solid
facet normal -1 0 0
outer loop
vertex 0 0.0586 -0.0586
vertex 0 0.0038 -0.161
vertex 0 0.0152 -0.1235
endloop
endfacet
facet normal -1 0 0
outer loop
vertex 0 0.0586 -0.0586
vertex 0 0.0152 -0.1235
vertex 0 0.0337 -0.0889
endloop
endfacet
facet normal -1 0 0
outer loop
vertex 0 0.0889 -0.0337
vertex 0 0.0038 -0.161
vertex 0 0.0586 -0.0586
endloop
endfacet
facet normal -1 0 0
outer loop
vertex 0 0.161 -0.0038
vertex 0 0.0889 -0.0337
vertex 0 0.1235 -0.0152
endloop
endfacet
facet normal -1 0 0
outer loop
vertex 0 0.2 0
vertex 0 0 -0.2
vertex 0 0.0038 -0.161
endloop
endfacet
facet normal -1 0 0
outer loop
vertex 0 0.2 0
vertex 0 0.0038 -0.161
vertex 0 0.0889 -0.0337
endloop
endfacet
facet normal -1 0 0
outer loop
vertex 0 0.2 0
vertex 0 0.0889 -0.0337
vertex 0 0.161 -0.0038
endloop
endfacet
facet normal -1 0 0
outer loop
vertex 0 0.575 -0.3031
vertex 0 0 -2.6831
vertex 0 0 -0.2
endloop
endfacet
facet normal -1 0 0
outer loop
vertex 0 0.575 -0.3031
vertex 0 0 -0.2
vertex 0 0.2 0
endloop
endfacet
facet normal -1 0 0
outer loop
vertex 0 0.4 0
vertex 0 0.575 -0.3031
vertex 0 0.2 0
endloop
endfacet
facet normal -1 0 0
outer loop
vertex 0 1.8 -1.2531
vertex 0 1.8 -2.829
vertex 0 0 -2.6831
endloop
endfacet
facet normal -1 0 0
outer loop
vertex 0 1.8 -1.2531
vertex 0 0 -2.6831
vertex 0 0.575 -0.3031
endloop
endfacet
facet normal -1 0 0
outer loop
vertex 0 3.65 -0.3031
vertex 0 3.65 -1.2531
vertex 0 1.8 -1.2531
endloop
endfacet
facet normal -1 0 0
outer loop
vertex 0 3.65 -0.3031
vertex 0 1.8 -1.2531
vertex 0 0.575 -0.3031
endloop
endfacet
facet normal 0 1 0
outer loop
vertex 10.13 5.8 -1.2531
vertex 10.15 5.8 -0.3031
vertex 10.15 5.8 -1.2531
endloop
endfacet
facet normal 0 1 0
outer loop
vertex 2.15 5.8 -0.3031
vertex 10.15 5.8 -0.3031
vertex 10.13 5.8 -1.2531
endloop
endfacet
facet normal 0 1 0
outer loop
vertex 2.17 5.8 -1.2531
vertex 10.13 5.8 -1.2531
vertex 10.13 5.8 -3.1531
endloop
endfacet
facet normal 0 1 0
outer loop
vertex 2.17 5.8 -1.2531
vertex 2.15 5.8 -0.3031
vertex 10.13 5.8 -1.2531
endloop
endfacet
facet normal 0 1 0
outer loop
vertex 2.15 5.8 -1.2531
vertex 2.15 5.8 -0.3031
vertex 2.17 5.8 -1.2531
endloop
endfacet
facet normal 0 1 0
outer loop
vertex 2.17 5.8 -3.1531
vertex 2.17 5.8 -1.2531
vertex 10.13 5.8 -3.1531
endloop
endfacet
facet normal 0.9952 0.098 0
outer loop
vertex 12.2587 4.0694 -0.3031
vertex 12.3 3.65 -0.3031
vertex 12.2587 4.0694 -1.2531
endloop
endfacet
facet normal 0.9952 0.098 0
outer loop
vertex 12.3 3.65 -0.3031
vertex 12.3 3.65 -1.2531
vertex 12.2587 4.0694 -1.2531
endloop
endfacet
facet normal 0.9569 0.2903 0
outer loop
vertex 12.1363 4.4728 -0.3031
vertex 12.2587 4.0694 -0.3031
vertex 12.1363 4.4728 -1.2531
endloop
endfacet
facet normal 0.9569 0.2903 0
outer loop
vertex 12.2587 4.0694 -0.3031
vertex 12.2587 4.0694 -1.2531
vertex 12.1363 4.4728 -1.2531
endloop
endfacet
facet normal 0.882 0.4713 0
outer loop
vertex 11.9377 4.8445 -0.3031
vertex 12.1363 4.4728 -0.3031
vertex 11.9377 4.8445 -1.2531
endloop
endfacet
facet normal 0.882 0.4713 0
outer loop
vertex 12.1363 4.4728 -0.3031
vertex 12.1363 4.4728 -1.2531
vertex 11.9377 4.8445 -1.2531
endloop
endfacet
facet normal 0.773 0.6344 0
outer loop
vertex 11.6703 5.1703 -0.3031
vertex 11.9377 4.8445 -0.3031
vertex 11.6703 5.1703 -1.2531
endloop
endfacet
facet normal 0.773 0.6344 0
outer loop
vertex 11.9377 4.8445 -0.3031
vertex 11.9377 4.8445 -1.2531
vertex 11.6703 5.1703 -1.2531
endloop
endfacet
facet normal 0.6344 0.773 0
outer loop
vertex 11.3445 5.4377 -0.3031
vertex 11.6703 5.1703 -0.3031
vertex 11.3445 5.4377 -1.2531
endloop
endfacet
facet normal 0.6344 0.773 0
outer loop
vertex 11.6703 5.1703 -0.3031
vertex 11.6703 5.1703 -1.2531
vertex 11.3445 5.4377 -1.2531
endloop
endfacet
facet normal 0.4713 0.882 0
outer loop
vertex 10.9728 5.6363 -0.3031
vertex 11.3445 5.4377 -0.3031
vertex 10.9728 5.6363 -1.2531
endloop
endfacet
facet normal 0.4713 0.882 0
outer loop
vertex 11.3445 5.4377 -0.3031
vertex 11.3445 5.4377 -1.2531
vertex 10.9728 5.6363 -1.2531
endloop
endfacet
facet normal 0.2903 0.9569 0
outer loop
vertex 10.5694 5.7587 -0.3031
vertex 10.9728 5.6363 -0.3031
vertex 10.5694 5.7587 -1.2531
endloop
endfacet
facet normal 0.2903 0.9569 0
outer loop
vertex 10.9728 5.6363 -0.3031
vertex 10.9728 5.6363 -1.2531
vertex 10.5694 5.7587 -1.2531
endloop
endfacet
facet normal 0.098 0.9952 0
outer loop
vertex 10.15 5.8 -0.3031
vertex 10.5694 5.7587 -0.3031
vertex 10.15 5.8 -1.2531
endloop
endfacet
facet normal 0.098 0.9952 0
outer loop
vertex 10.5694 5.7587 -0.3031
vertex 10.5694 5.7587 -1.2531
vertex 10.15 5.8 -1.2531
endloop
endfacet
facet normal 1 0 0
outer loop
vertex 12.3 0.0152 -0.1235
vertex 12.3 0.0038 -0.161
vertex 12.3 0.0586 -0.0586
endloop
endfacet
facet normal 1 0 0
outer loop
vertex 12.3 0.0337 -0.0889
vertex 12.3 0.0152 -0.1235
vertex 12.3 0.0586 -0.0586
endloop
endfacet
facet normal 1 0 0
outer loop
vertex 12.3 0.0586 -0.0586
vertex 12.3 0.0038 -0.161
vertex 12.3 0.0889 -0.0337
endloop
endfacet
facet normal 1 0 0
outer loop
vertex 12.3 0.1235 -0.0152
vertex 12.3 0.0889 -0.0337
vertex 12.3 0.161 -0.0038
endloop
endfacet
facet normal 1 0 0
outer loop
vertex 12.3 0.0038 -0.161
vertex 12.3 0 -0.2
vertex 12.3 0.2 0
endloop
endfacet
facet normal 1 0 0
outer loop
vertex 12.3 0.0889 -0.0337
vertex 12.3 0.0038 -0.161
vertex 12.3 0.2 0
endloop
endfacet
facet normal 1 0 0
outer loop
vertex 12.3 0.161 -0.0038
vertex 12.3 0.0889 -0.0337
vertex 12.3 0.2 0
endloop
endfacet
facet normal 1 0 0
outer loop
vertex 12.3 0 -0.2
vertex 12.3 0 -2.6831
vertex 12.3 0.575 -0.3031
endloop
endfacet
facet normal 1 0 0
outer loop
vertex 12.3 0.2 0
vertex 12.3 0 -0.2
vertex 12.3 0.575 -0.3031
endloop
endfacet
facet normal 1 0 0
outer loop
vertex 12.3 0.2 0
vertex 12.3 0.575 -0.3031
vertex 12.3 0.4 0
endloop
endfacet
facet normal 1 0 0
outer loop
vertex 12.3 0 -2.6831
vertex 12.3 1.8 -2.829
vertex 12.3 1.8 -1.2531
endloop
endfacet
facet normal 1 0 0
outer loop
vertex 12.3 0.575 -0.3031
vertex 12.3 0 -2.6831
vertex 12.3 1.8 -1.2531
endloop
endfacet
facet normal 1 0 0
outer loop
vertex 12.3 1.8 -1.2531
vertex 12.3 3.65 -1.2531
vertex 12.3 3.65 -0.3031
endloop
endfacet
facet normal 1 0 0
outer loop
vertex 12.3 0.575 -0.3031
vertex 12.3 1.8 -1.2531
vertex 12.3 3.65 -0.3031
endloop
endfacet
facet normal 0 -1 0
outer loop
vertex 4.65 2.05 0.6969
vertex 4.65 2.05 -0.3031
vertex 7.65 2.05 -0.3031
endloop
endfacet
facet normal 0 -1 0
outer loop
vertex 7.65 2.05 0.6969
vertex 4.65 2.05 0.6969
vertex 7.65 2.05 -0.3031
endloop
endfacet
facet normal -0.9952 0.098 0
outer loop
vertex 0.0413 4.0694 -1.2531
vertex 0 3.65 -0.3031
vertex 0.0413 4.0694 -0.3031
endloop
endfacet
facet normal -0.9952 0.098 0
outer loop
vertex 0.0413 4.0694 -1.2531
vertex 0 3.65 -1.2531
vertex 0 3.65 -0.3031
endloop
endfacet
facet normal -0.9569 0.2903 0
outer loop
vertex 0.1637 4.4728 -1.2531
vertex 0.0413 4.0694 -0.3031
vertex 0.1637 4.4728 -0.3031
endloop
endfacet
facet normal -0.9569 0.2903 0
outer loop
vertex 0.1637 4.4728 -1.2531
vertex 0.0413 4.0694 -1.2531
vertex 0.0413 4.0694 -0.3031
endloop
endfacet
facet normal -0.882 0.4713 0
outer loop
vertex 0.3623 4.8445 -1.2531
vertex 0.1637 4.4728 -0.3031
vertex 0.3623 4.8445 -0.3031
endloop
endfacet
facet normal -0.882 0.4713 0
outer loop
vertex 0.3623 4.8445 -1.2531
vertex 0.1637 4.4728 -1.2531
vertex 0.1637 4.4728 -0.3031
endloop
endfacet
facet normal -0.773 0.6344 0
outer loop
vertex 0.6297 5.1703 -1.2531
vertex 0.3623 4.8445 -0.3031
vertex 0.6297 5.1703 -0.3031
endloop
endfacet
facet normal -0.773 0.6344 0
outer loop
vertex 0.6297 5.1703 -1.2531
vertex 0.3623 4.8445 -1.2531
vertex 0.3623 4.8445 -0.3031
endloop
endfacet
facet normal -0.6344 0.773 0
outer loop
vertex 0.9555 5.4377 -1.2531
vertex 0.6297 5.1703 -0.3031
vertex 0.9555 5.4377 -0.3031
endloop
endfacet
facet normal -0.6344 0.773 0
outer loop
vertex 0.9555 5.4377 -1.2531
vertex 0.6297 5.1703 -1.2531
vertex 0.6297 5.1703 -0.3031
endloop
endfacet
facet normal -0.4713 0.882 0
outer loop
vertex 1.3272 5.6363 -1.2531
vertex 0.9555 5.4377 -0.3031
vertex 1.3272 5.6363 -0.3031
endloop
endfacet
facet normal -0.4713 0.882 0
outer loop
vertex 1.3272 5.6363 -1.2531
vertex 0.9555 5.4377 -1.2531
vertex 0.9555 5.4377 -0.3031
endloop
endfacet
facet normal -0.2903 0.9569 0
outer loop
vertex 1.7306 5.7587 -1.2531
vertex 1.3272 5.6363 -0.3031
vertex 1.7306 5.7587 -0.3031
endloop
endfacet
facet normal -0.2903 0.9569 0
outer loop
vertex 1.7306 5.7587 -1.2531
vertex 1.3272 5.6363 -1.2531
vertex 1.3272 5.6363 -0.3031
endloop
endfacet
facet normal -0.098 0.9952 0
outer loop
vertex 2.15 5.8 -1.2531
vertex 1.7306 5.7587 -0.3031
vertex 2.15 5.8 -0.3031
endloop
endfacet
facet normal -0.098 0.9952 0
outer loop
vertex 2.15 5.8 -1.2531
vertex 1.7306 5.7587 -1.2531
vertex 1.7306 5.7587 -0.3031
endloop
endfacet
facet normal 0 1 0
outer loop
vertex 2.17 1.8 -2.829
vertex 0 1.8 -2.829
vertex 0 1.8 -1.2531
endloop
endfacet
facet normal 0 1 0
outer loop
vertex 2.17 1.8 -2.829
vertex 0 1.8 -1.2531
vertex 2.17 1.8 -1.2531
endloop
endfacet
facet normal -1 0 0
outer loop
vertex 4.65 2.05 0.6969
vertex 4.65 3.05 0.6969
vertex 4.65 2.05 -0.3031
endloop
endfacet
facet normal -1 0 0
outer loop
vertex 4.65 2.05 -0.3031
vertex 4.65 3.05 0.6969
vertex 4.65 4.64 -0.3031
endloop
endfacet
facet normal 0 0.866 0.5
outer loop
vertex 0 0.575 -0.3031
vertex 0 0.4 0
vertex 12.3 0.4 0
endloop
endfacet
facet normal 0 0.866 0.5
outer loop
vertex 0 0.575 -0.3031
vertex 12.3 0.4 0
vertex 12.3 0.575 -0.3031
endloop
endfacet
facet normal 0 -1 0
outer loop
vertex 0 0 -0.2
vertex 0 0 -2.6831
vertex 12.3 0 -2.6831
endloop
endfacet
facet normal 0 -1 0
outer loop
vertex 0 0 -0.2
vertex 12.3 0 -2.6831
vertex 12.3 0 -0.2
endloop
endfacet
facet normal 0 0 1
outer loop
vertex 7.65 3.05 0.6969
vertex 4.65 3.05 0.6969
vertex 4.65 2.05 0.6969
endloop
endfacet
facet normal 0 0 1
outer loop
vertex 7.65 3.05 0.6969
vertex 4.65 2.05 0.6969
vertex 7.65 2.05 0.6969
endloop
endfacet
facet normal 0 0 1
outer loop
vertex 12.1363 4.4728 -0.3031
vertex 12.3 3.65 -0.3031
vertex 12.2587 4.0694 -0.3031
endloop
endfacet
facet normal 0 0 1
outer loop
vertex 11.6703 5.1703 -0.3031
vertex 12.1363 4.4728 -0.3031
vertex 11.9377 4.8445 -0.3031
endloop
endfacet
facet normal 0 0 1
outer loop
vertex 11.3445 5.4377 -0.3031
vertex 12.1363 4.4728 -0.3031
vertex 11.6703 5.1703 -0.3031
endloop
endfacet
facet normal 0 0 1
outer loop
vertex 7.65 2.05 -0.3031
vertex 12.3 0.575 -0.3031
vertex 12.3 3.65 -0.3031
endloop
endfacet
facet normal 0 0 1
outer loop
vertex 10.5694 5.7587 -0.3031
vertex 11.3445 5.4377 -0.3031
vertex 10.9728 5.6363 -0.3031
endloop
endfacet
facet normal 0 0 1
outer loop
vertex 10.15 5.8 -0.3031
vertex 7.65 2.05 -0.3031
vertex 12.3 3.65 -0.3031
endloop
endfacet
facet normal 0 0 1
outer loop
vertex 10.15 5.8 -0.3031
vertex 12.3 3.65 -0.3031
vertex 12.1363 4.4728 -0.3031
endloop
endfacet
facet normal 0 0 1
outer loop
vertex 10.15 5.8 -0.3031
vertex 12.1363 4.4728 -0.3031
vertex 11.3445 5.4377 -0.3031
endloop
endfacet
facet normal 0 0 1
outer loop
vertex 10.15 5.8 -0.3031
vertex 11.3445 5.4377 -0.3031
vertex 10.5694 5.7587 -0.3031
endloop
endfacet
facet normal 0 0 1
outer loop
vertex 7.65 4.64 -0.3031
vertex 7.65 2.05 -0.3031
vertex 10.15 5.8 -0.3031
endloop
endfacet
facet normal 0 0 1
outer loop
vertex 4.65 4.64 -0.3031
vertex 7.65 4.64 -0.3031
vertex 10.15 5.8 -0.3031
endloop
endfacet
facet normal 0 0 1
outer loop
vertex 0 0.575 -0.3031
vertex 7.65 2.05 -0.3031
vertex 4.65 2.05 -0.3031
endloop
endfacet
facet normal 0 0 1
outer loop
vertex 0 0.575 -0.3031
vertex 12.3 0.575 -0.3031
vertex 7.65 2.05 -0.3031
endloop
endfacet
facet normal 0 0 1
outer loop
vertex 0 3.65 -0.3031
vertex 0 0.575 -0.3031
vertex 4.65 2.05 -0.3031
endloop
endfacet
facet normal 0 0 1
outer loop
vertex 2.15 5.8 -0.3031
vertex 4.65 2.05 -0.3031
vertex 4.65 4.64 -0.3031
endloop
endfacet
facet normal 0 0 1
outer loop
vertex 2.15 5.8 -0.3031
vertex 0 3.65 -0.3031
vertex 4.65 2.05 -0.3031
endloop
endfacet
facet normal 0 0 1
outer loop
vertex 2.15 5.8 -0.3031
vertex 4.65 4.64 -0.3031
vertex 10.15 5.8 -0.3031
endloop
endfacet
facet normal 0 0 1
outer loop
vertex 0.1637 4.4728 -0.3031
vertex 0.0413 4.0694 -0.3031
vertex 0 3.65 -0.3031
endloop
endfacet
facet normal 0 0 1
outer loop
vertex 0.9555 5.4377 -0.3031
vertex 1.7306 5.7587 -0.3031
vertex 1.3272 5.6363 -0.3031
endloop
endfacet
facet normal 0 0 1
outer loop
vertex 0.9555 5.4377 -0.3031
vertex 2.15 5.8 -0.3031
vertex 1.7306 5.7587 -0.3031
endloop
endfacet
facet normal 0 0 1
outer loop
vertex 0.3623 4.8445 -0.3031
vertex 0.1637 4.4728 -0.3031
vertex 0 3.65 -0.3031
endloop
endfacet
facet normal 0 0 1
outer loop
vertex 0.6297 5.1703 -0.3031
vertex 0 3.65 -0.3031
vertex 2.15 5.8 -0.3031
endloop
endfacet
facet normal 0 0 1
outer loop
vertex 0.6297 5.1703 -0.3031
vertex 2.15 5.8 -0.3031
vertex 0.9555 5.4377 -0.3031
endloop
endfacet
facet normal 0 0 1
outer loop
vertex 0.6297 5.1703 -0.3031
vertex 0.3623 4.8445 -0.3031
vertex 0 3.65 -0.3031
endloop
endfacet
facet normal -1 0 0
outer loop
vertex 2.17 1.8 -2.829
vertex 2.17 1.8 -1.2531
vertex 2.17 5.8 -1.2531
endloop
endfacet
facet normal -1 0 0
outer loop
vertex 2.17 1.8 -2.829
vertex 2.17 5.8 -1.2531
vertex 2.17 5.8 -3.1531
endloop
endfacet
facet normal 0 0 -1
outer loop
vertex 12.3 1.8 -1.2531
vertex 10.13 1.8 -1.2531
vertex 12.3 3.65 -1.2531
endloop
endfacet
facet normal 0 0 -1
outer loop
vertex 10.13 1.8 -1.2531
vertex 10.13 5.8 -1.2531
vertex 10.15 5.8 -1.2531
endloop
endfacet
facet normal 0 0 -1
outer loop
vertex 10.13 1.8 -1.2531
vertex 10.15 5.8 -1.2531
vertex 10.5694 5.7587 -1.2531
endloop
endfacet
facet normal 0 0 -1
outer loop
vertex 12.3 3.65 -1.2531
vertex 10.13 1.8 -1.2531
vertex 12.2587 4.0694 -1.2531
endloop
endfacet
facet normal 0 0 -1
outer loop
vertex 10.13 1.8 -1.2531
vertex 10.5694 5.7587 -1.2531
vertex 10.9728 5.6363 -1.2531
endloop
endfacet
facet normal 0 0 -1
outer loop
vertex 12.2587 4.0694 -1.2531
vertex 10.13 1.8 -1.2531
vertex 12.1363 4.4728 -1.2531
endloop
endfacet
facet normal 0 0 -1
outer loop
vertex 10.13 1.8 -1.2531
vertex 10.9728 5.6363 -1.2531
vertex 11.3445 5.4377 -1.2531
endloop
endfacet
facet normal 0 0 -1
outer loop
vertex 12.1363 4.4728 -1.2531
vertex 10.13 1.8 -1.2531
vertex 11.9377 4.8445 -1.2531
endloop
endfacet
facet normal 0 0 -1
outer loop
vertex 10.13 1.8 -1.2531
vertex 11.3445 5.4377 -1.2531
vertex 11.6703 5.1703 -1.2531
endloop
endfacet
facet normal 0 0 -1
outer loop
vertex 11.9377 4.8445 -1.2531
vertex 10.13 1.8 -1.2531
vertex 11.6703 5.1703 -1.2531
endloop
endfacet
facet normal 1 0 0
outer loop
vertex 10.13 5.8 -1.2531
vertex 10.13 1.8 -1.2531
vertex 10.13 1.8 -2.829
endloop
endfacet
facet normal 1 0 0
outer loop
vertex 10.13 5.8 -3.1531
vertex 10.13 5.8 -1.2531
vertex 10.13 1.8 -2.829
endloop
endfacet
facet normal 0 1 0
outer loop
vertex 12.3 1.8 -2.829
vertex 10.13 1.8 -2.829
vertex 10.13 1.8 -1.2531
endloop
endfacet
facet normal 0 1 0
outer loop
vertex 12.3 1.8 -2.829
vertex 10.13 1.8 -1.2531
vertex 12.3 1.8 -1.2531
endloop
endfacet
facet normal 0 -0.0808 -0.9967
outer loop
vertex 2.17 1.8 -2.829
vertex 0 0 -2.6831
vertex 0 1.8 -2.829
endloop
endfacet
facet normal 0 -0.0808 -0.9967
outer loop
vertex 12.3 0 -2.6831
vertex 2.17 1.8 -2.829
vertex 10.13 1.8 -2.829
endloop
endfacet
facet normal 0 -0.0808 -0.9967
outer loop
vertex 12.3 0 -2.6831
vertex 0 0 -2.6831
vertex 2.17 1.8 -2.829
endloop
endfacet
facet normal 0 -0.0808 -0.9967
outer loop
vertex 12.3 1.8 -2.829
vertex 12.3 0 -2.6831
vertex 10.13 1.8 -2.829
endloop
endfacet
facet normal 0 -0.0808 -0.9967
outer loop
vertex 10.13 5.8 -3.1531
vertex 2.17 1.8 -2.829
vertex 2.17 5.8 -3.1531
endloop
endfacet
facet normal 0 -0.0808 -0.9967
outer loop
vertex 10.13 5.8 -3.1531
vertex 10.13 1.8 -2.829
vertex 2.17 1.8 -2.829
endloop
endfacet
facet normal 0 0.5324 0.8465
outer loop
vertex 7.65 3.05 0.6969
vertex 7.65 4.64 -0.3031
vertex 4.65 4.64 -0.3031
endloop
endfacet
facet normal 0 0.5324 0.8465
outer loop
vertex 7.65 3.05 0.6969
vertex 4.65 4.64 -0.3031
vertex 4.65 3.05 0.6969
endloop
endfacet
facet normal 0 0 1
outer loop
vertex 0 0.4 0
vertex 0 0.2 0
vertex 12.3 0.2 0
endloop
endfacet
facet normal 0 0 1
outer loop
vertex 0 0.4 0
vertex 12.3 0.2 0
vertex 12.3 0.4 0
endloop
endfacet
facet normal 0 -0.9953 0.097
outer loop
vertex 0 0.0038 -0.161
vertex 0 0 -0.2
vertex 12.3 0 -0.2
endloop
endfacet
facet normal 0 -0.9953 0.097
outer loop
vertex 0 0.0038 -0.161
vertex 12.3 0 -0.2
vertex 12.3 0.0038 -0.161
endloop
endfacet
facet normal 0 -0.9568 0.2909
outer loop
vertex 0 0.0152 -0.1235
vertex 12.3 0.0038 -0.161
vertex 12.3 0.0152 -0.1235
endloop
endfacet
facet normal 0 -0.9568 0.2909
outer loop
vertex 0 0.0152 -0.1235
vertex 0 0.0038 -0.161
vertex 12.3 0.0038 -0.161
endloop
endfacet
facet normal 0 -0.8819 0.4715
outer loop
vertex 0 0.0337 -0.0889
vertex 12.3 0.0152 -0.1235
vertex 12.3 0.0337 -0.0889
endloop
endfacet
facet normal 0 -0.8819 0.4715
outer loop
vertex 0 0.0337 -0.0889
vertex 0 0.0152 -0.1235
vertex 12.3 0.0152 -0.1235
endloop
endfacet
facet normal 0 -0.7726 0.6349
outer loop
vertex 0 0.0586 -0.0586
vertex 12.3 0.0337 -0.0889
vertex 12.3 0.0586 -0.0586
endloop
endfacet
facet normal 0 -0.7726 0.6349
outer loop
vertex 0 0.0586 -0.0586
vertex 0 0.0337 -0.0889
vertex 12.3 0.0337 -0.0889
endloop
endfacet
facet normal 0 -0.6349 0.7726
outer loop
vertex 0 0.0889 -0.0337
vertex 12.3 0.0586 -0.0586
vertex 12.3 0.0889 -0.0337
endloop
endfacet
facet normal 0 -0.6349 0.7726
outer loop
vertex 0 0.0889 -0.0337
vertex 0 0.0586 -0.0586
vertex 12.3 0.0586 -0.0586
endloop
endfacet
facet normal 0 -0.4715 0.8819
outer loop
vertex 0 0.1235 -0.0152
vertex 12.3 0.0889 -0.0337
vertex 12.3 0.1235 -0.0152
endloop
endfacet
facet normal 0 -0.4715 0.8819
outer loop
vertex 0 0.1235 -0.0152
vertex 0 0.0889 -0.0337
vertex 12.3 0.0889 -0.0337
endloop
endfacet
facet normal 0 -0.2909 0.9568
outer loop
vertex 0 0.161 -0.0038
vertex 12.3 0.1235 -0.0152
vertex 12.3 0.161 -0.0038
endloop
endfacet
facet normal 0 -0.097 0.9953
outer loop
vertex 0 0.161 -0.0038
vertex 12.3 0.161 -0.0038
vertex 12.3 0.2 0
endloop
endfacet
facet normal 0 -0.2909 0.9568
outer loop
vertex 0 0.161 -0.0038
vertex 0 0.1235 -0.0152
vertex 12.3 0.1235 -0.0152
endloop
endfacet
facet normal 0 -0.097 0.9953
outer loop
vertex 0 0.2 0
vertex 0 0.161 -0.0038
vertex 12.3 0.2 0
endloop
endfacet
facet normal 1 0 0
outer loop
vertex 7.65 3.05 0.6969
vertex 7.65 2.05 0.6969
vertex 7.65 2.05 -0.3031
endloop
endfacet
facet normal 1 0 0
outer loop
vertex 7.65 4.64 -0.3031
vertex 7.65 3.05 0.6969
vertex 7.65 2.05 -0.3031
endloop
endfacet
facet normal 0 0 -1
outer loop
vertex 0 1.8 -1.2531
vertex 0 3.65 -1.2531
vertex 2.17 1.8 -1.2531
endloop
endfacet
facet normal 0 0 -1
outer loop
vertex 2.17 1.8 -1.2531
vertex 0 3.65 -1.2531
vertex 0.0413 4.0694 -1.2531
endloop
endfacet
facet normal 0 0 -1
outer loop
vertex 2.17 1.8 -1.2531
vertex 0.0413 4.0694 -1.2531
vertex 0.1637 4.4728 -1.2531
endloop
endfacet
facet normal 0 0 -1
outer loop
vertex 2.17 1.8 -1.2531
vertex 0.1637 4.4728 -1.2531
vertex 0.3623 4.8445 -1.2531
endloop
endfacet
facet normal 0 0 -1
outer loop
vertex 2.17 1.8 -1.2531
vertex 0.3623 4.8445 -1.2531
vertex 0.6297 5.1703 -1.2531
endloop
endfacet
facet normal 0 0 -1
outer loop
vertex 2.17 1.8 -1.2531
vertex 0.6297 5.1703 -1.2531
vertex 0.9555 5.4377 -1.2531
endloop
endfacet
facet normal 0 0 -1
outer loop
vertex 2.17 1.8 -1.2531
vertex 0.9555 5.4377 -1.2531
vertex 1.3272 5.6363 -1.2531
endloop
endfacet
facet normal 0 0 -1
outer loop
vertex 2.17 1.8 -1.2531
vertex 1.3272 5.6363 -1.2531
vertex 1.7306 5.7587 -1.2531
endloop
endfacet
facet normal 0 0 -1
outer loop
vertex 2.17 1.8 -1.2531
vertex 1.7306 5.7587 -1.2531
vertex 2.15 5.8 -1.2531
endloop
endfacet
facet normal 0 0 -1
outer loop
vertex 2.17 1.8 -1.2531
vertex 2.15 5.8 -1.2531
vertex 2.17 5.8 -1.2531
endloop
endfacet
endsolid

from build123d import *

# Parameters (mm, degrees)
BOSS_EXTRUDE1_DEPTH = 12.3
SKETCH2_W           = 2.17
SKETCH2_H           = 2.05
CUT_EXTRUDE1_DEPTH  = 4
FILLET1_R           = 2.15
SKETCH4_W           = 3
SKETCH4_H           = 1
BOSS_EXTRUDE2_DEPTH = 1
BOSS_EXTRUDE3_DEPTH = 3
CUT_EXTRUDE2_DEPTH  = 14.994303425


with BuildPart() as part:
    # Sketch1 → Boss-Extrude1 (new body)
    with BuildSketch(Plane(origin=(0, 0, 0), x_dir=(0, 0, -1), z_dir=(1, 0, 0))):
        with BuildLine():
            Line((0, 0.2), (0, 0.4))
            Line((0, 0.4), (0.303108891, 0.575))
            Line((0.303108891, 0.575), (0.303108891, 5.8))
            Line((0.303108891, 5.8), (3.303108891, 5.8))
            Line((3.303108891, 5.8), (3.303108891, 0))
            Line((3.303108891, 0), (0.2, 0))
            ThreePointArc((0.2, 0), (0.058578644, 0.058578644), (0, 0.2))
        make_face()
    extrude(amount=BOSS_EXTRUDE1_DEPTH)

    # Sketch2 → Cut-Extrude1 (cut)
    with BuildSketch(Plane(origin=(0, 5.8, 0), x_dir=(1, 0, 0), z_dir=(0, 1, 0))):
        with Locations((1.085, 2.278108891)):
            Rectangle(SKETCH2_W, SKETCH2_H)
        with Locations((11.215, 2.278108891)):
            Rectangle(SKETCH2_W, SKETCH2_H)
    extrude(amount=-CUT_EXTRUDE1_DEPTH, mode=Mode.SUBTRACT)

    # Fillet1
    fillet1_edges = [part.edges().sort_by_distance(p)[0] for p in [
        (0, 5.8, -0.778108891),
        (12.3, 5.8, -0.778108891),
    ]]
    fillet(fillet1_edges, radius=FILLET1_R)

    # Sketch4 → Boss-Extrude2 (add)
    with BuildSketch(Plane.XY.offset(-0.303108891)):
        with Locations((6.15, 2.55)):
            Rectangle(SKETCH4_W, SKETCH4_H)
    extrude(amount=BOSS_EXTRUDE2_DEPTH)

    # Sketch5 → Boss-Extrude3 (add)
    with BuildSketch(Plane(origin=(7.65, 0, 0), x_dir=(0, 0, -1), z_dir=(1, 0, 0))):
        Polygon((-0.696891109, 3.05), (0.303108891, 3.05), (0.303108891, 4.64), align=None)
    extrude(amount=-BOSS_EXTRUDE3_DEPTH)

    # Sketch7 → Cut-Extrude2 (cut, through all)
    with BuildSketch(Plane(origin=(12.3, 0, 0), x_dir=(0, 0, -1), z_dir=(1, 0, 0))):
        Polygon((3.303108891, 5.8), (3.303108891, 0), (2.683108891, 0), (3.153108891, 5.8), align=None)
    extrude(amount=-CUT_EXTRUDE2_DEPTH, mode=Mode.SUBTRACT)


solid = part.part
